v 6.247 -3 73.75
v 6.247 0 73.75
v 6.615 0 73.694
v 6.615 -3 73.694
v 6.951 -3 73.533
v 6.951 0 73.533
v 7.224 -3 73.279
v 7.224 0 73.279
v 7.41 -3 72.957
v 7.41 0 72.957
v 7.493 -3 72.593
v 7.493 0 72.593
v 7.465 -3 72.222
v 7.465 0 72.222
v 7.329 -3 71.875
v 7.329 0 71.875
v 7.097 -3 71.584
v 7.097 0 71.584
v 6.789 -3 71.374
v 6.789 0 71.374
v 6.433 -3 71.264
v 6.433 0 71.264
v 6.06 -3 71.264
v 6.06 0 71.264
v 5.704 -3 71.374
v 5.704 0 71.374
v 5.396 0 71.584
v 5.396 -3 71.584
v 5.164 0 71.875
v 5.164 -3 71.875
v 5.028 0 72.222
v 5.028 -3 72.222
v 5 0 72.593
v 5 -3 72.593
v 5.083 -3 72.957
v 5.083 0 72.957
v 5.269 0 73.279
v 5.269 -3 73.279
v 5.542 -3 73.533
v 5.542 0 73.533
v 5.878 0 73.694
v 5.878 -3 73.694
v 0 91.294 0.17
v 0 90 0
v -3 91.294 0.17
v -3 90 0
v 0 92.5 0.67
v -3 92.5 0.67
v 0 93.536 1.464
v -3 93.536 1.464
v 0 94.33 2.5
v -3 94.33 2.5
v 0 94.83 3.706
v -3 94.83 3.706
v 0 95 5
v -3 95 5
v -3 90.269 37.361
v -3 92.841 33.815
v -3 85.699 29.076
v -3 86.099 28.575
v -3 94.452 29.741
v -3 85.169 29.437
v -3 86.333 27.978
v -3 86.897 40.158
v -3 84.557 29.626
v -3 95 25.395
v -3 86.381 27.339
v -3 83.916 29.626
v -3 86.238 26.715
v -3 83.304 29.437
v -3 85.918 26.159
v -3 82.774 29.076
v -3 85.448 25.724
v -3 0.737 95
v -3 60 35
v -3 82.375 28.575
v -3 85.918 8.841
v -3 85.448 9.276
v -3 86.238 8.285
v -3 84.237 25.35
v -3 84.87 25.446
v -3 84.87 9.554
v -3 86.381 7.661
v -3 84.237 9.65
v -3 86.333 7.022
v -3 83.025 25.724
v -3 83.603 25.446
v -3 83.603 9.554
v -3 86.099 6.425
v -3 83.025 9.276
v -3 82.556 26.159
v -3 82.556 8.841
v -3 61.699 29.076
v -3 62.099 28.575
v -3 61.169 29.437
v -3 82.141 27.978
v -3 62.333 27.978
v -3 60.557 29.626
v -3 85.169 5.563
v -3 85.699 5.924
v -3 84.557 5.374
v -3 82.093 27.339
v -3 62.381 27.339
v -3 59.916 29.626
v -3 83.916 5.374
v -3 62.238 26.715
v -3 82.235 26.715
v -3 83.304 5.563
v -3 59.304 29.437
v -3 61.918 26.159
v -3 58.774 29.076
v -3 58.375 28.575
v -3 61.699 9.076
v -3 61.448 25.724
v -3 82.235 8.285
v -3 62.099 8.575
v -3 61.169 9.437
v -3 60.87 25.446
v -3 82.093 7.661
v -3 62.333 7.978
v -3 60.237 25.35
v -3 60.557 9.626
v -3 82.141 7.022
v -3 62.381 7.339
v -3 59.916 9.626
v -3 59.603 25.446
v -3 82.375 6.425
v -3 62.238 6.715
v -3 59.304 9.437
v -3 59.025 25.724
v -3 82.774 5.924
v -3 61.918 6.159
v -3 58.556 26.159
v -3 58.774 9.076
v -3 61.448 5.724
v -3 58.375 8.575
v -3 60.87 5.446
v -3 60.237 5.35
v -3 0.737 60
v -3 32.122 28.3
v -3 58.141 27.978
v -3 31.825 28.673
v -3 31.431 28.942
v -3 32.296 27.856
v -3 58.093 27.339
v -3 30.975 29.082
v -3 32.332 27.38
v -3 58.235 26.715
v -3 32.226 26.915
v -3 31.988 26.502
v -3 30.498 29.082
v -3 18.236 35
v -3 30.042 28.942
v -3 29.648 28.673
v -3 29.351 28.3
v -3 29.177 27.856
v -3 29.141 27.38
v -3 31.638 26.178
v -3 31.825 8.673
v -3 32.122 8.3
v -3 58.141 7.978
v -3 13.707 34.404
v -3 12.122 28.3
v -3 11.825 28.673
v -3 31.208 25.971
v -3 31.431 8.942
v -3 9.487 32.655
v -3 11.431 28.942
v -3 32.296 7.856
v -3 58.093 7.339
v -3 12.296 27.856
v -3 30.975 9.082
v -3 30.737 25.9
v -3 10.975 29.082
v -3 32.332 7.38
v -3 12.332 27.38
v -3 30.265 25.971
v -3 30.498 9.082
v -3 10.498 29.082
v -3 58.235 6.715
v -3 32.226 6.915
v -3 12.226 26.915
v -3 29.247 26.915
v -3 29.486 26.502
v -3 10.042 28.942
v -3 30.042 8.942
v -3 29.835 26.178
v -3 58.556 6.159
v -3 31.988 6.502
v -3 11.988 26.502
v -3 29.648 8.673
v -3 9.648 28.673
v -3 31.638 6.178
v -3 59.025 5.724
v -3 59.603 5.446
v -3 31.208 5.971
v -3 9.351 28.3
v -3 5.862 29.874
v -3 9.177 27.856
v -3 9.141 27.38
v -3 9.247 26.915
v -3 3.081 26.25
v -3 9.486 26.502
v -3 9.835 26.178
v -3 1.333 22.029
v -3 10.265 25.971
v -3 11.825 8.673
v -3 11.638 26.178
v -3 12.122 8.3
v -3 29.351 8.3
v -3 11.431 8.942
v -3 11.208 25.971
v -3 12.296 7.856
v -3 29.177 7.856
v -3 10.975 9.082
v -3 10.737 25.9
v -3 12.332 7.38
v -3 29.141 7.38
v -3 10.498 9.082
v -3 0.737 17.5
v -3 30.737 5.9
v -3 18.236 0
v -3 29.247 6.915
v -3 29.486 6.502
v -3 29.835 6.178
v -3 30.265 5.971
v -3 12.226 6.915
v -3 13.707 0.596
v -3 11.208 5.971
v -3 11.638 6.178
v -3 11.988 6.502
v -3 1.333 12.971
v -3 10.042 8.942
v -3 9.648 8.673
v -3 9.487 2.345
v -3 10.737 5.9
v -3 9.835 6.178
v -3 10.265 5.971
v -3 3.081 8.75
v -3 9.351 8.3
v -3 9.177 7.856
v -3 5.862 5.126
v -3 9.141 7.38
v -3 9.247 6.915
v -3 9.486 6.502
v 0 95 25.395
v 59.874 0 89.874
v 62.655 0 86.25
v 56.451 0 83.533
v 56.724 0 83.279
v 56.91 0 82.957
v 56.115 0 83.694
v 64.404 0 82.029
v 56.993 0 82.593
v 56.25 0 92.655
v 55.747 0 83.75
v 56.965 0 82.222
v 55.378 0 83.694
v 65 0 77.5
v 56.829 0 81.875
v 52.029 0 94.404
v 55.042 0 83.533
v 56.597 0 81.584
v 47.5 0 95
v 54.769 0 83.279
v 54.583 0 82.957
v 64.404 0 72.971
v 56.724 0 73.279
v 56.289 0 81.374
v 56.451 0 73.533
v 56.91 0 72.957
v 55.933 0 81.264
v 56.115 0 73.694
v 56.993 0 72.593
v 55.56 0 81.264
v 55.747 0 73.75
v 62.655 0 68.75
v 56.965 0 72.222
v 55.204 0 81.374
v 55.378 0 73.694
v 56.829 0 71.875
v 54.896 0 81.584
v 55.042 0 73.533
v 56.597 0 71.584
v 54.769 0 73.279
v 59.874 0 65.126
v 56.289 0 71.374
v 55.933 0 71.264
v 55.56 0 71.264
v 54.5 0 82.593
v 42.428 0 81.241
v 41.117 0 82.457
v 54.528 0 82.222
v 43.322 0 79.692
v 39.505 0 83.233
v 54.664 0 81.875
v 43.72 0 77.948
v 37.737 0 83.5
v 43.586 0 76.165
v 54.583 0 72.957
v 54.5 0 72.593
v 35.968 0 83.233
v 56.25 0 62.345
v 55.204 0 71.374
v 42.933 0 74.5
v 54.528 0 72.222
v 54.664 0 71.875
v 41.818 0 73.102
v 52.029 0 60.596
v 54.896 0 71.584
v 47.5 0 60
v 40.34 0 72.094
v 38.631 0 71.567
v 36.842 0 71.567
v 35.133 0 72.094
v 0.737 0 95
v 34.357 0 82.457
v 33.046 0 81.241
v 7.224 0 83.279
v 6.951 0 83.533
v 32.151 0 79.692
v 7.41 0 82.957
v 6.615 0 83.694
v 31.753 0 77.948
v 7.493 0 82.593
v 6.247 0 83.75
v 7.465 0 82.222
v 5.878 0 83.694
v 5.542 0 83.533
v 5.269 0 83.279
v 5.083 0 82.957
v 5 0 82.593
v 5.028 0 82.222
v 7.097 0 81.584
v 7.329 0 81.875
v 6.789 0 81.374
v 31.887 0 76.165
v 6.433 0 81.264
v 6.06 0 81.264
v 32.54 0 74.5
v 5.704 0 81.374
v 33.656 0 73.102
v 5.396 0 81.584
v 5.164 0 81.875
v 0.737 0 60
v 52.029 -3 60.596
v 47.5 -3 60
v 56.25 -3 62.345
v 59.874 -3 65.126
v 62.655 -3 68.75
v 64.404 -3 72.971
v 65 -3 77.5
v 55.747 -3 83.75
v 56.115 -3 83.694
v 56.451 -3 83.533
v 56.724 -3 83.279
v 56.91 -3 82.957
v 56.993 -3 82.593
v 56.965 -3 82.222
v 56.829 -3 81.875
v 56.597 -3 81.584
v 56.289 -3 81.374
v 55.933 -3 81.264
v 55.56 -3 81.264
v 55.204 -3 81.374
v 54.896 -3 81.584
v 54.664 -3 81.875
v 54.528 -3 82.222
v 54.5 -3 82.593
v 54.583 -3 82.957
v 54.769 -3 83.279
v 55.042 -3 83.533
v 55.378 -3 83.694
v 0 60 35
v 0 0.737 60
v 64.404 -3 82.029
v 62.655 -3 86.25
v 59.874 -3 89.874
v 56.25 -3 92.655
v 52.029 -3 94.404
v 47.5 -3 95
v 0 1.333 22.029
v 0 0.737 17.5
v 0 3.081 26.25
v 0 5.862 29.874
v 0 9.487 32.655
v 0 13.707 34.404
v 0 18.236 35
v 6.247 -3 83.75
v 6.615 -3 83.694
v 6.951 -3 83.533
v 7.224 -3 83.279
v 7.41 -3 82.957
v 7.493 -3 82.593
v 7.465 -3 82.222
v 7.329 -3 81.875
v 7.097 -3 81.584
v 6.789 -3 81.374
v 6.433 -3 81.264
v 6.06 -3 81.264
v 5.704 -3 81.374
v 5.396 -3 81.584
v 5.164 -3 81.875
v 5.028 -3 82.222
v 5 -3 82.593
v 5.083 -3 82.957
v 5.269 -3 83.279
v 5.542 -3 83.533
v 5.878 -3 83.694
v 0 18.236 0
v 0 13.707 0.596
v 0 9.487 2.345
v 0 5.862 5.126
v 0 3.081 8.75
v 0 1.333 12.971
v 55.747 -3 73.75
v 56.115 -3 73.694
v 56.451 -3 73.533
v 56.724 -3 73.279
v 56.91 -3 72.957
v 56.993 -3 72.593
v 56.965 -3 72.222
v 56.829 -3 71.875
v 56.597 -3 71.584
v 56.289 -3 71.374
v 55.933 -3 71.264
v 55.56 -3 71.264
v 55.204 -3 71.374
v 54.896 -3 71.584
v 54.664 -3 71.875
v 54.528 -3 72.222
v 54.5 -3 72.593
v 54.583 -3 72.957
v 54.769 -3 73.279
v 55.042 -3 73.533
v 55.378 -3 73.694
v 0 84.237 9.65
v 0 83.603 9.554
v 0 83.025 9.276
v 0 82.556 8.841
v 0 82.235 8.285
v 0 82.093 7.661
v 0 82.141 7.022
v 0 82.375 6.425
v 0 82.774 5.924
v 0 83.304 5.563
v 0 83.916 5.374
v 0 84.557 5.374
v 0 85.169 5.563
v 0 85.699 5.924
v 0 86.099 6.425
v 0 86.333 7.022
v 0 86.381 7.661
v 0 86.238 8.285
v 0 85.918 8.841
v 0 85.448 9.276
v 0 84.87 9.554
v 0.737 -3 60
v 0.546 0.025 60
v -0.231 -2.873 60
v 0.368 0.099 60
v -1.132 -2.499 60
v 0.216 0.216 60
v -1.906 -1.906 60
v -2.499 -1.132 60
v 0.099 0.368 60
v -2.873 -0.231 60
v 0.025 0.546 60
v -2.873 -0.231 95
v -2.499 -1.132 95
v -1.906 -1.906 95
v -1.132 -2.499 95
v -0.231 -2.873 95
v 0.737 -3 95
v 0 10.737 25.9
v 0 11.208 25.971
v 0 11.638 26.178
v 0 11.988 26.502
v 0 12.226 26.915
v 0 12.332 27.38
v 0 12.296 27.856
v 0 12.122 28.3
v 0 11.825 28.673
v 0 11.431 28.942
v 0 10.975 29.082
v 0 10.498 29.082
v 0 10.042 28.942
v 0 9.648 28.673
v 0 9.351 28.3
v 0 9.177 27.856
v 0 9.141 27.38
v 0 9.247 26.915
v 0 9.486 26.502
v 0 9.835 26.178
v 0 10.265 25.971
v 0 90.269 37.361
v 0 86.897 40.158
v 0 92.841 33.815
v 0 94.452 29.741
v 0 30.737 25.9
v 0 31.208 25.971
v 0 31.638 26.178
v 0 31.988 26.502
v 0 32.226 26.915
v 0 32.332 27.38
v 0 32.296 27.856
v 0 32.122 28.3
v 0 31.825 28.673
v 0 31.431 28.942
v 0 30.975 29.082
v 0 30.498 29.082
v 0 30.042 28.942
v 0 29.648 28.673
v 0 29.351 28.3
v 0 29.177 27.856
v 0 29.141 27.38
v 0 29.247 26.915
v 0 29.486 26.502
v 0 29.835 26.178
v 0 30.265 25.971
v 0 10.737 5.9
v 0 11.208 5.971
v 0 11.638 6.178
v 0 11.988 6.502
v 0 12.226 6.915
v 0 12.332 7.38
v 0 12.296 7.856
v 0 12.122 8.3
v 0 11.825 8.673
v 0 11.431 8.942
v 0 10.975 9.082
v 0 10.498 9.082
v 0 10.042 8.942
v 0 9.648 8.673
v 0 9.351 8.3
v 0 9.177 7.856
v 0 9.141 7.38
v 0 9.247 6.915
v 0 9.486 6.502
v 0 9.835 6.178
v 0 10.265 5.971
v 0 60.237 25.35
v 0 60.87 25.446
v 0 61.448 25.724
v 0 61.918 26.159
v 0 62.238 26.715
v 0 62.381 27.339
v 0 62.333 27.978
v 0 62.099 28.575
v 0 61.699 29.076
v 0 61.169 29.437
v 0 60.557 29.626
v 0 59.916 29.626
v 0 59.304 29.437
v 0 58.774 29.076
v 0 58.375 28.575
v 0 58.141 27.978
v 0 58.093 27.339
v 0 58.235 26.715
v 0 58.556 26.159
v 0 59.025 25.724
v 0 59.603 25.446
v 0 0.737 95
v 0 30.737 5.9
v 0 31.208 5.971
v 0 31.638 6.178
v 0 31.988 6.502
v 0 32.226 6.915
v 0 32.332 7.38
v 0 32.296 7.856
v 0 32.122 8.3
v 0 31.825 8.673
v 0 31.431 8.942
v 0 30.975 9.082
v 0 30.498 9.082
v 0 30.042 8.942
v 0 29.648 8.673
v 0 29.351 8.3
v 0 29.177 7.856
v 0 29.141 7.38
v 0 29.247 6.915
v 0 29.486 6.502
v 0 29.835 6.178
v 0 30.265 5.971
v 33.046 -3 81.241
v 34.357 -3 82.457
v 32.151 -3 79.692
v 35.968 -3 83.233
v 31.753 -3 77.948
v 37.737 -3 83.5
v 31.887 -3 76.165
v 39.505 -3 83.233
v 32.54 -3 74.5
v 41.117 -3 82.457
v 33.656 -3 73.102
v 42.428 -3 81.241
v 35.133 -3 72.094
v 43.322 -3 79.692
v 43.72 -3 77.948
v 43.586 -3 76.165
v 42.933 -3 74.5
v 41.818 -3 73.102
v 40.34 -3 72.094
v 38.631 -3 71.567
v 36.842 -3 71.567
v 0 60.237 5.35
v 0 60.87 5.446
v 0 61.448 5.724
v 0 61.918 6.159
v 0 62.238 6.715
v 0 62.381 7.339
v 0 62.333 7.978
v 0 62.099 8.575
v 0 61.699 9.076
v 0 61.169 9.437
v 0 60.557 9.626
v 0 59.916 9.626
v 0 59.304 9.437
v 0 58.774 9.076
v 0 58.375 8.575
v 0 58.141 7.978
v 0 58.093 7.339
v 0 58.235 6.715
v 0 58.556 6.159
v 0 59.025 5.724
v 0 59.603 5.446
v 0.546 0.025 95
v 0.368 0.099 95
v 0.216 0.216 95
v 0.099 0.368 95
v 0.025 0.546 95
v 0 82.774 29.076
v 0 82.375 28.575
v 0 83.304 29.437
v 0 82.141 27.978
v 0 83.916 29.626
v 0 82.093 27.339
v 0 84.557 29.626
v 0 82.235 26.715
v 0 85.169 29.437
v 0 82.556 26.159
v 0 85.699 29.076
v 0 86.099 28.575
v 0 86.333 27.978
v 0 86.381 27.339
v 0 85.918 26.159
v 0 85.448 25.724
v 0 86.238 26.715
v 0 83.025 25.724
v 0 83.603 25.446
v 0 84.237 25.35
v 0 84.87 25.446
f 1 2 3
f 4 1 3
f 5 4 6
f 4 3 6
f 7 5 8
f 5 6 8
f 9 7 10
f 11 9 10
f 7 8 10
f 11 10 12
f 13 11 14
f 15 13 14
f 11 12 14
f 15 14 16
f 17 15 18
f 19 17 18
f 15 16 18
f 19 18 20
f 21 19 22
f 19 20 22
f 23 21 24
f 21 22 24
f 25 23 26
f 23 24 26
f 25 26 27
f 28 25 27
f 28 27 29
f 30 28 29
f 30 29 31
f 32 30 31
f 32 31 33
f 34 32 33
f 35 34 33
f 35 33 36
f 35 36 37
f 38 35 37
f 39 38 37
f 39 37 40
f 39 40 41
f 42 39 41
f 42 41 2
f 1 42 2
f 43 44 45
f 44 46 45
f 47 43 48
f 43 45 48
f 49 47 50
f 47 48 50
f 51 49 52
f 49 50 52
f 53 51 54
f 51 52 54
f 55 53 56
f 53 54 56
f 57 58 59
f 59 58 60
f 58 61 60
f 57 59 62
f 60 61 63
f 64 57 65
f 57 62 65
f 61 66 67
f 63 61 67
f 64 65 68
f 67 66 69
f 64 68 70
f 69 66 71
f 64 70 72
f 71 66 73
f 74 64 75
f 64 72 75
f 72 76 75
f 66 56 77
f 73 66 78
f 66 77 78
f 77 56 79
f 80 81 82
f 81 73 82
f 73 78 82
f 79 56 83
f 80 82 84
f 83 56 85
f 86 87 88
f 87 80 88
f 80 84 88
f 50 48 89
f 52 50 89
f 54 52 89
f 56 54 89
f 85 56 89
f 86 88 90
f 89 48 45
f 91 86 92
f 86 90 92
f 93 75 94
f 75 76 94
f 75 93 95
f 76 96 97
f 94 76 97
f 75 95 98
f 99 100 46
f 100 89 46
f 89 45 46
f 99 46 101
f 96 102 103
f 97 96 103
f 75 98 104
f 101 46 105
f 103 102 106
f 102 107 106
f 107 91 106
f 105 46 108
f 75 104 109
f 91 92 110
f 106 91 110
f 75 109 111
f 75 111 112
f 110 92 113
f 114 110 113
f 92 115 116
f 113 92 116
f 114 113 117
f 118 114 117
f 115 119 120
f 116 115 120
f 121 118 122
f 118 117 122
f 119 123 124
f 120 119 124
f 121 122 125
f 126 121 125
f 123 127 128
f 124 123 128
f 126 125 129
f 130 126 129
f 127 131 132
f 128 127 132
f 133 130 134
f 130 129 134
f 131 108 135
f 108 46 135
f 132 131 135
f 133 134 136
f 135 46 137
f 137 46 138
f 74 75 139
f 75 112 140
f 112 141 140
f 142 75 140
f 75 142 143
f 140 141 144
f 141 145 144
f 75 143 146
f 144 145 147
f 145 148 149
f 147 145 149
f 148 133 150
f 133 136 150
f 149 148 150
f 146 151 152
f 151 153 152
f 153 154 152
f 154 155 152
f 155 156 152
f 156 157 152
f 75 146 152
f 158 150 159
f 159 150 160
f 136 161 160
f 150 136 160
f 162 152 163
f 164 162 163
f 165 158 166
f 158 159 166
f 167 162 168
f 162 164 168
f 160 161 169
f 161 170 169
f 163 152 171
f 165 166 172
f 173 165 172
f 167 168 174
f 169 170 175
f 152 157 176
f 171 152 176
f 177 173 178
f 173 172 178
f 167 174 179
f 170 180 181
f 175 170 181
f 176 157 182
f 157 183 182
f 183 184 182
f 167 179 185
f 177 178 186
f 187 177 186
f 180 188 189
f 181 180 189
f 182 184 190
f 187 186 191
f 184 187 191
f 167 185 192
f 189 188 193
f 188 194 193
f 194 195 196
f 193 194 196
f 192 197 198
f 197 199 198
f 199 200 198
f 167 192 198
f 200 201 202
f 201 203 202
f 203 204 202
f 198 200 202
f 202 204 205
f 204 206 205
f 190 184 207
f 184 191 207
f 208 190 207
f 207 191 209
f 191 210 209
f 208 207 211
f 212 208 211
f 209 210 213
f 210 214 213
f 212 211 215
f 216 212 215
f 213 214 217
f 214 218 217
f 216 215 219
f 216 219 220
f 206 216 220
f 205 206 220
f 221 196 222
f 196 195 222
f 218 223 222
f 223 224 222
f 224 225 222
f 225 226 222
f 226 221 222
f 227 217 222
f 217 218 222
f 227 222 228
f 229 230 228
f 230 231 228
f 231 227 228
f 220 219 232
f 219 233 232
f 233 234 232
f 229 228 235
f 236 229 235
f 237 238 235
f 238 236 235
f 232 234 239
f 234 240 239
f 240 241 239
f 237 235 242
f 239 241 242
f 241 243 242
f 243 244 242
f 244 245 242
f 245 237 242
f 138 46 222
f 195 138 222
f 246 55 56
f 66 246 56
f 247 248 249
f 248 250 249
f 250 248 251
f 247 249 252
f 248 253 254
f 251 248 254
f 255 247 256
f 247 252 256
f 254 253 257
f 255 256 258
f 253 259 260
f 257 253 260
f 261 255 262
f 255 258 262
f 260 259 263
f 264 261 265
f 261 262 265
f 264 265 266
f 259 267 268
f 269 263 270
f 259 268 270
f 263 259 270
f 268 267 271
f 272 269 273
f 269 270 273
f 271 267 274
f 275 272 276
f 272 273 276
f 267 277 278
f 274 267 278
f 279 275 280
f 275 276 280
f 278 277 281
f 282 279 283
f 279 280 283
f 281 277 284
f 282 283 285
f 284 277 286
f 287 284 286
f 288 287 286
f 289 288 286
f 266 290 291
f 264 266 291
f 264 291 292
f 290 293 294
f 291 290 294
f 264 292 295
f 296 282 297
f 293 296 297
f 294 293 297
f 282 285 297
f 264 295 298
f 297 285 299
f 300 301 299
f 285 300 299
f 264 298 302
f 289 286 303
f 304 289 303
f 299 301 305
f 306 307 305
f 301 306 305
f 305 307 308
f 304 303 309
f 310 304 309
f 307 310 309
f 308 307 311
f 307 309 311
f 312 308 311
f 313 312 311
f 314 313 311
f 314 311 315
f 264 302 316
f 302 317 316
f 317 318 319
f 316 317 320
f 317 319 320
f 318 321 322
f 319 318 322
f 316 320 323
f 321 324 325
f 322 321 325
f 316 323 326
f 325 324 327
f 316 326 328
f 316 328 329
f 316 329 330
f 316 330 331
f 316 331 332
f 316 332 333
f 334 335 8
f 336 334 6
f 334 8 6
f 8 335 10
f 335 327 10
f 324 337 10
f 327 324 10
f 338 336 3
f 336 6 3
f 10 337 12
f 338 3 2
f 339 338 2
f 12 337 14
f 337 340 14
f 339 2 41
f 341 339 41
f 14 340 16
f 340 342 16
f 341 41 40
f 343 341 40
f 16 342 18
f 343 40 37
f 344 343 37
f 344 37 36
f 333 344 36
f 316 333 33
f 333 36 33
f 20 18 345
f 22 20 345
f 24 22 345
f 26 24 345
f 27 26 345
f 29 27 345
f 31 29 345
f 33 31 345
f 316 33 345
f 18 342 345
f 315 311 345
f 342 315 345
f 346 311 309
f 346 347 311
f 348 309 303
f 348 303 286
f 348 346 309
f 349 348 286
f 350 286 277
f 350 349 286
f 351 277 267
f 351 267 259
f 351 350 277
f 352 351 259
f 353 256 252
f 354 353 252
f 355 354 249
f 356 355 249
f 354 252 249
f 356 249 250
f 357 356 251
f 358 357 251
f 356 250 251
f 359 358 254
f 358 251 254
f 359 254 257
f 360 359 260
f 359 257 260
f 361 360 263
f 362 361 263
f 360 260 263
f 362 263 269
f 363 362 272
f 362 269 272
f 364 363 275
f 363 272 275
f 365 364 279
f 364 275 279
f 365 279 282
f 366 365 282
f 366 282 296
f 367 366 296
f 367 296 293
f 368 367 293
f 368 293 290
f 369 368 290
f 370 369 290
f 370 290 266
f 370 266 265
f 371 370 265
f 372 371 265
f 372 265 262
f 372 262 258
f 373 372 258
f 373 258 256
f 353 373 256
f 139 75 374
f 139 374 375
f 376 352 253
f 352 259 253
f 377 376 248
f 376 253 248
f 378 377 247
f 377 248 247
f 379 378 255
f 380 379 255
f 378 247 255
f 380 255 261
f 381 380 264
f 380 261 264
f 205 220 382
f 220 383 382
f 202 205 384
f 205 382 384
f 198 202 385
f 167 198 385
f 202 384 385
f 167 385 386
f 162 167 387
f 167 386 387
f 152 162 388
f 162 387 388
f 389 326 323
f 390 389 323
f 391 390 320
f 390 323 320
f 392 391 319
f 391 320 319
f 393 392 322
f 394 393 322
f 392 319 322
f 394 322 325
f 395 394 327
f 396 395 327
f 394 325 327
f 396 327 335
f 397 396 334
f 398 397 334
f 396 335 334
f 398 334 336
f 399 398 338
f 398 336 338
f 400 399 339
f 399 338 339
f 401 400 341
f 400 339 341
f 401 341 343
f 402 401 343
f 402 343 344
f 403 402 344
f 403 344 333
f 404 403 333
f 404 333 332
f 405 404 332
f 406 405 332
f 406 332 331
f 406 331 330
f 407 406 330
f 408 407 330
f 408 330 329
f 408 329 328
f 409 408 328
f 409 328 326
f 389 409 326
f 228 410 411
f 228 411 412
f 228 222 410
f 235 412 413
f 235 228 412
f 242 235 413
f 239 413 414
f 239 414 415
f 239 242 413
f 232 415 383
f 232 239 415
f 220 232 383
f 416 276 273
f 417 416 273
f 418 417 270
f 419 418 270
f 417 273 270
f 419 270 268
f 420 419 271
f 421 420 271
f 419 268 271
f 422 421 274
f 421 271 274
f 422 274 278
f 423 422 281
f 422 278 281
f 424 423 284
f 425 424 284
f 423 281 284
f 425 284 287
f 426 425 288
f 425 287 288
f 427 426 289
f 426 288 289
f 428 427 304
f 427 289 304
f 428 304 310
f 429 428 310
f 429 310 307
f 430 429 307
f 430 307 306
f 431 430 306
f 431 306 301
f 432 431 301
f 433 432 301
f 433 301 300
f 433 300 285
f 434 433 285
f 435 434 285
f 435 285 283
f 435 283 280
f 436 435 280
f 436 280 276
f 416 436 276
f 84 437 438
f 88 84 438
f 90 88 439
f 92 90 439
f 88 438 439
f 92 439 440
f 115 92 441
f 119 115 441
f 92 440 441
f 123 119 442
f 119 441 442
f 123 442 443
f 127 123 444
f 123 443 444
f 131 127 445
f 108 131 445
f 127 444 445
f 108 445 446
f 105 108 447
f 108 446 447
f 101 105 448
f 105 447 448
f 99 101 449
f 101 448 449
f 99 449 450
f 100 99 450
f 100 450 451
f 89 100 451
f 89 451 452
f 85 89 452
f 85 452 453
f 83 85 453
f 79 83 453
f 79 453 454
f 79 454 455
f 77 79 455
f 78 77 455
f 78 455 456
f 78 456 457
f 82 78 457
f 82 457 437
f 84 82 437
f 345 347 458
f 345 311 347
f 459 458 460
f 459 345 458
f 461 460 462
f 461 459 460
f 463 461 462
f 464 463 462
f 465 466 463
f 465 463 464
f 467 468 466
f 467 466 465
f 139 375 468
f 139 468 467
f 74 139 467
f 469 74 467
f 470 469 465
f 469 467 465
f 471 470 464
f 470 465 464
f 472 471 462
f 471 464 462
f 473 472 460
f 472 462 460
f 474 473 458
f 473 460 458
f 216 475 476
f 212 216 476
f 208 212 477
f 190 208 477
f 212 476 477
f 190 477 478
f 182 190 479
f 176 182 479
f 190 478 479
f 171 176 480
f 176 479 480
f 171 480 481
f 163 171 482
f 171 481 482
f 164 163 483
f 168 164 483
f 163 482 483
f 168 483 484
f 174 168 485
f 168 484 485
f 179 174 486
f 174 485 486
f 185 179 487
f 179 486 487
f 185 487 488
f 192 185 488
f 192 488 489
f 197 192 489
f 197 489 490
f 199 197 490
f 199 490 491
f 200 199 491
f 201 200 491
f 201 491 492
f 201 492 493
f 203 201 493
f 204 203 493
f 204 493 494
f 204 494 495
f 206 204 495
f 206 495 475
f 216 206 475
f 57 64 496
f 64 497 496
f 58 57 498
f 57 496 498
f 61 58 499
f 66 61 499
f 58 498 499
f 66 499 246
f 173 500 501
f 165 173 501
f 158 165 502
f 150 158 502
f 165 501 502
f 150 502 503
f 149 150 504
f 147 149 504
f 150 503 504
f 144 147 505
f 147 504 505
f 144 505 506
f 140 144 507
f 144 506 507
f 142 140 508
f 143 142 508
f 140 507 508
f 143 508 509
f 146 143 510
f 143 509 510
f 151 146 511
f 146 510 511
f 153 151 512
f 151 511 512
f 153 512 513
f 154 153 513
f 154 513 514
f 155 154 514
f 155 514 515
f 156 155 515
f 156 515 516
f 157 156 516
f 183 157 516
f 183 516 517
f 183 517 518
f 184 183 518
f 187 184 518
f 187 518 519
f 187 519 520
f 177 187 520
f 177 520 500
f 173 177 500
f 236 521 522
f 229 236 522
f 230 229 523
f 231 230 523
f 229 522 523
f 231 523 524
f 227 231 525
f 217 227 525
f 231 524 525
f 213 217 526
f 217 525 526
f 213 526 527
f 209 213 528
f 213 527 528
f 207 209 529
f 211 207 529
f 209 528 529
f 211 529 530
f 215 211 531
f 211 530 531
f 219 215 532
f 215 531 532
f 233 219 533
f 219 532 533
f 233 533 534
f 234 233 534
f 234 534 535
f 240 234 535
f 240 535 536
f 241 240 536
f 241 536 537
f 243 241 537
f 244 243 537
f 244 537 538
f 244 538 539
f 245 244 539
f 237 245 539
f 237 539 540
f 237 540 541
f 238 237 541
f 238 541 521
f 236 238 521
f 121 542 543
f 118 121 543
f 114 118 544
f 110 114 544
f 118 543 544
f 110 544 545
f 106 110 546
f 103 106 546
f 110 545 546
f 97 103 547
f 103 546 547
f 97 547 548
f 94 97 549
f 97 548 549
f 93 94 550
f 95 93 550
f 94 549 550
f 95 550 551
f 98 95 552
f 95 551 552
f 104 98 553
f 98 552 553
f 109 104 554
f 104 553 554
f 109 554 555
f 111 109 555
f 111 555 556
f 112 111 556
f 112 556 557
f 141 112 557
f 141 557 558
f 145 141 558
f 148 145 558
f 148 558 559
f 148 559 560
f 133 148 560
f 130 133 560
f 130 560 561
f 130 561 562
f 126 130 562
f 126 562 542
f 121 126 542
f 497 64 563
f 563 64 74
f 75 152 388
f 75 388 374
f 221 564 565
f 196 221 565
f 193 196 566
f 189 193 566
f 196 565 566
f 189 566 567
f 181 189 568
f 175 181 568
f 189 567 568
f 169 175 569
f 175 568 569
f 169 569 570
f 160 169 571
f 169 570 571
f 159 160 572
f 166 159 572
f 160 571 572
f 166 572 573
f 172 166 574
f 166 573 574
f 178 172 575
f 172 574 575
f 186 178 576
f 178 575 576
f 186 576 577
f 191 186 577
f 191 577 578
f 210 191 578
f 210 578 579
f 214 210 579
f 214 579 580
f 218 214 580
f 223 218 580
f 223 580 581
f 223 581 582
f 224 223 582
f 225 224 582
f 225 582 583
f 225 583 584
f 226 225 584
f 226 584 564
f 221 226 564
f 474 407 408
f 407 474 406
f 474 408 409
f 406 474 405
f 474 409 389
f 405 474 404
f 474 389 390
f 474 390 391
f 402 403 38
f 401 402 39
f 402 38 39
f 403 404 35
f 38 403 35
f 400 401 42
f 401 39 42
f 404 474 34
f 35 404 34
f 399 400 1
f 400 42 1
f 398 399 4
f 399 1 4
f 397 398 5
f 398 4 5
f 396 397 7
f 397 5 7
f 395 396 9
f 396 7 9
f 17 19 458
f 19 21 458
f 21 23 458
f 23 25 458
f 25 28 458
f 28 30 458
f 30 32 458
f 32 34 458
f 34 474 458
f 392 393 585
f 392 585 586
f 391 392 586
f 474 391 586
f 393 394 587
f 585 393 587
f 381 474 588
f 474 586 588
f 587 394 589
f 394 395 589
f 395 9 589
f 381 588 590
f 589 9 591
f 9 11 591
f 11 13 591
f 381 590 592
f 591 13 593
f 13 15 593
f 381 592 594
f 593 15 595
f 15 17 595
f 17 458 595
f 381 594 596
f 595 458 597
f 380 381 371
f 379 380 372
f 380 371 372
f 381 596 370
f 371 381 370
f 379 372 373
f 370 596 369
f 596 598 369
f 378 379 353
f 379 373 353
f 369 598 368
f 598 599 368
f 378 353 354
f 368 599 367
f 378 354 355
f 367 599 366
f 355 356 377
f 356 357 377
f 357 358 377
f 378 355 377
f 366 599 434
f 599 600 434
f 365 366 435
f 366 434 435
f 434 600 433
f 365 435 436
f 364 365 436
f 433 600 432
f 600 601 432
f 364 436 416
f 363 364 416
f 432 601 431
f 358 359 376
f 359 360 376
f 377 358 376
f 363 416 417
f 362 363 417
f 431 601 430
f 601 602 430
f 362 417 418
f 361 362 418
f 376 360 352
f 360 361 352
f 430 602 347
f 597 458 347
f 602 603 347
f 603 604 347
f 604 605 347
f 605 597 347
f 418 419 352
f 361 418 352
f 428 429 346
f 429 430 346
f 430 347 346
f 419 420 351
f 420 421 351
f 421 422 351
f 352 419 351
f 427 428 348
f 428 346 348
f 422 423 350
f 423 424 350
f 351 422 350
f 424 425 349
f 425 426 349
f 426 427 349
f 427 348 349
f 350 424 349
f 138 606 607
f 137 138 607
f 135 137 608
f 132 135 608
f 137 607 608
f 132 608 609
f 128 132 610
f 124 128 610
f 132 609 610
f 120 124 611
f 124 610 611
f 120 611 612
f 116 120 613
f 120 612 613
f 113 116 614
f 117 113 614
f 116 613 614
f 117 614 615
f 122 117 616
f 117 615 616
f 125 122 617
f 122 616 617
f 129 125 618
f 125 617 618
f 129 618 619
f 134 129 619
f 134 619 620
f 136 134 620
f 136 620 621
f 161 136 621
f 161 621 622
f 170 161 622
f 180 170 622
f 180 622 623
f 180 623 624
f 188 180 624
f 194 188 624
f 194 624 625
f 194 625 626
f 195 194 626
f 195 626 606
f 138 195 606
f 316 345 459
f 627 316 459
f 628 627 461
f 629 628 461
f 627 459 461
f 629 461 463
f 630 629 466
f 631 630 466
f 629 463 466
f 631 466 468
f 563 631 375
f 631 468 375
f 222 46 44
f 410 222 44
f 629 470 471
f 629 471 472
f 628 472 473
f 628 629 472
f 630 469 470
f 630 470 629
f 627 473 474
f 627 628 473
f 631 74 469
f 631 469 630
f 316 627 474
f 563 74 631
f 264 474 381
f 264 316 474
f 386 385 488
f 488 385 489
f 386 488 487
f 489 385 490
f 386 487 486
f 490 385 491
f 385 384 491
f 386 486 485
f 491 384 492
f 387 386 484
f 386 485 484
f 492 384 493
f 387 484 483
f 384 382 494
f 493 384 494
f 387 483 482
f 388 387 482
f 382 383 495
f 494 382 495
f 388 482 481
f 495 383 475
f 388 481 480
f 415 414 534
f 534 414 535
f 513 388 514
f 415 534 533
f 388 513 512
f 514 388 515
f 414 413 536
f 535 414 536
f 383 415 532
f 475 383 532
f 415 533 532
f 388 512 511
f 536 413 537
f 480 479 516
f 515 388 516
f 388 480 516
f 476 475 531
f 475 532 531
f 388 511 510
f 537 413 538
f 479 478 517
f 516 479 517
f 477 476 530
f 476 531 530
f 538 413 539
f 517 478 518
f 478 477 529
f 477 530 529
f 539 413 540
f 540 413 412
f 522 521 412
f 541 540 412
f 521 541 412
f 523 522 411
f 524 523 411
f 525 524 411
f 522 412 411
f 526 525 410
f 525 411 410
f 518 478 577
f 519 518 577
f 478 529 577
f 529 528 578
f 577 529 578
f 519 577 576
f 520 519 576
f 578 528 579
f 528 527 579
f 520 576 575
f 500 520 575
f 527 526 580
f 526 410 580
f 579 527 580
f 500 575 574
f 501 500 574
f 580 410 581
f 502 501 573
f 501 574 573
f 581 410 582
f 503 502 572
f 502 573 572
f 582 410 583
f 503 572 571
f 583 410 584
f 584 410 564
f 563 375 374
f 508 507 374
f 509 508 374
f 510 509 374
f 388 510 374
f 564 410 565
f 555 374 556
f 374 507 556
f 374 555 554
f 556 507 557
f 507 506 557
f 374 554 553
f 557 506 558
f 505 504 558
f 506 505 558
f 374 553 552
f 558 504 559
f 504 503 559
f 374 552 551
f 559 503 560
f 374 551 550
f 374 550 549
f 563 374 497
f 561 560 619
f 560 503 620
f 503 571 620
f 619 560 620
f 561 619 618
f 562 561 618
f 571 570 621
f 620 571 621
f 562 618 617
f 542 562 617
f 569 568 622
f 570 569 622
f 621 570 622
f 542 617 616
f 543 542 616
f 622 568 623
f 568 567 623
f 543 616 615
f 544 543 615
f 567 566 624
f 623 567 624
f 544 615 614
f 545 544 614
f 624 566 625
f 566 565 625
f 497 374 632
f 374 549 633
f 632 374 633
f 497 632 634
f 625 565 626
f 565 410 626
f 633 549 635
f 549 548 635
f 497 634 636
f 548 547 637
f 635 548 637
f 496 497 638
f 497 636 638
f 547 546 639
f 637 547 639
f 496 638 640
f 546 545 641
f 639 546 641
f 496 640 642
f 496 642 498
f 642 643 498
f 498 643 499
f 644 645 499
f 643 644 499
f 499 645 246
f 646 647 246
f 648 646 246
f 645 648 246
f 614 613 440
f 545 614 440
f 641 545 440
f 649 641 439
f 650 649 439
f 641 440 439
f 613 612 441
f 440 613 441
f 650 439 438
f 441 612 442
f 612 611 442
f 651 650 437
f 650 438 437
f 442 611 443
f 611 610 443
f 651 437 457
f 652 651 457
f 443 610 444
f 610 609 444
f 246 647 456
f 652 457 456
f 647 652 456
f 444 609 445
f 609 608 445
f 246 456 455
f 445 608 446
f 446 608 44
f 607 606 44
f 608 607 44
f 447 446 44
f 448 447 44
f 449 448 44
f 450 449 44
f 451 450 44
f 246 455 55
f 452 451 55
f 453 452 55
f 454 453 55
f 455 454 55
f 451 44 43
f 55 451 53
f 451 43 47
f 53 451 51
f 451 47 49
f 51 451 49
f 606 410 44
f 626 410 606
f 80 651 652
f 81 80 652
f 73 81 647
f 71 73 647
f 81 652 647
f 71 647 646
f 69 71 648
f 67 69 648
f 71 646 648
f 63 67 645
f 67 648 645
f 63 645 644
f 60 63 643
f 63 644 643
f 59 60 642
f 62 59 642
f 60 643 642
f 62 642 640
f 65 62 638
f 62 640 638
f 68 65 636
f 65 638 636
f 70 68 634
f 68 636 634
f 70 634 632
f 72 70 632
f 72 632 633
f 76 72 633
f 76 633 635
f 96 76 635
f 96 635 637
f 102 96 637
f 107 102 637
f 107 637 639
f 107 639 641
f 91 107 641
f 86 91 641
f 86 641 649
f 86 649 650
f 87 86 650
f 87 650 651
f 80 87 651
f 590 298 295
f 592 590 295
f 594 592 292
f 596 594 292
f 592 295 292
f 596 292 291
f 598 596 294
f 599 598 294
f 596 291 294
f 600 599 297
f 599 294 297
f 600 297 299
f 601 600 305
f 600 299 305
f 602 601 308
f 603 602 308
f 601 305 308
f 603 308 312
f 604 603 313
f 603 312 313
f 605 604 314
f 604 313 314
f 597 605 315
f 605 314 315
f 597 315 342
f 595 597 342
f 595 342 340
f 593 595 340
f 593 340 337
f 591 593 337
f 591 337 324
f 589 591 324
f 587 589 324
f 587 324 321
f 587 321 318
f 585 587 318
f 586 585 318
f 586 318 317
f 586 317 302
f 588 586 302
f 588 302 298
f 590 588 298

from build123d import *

# Parameters (mm, degrees)
SM_BASE_FLANGE_1_DEPTH = 95
FILLET_1_R             = 17.5
SKETCH_9_R             = 2.15
SKETCH_9_R_2           = 1.6
CUT_EXTRUDE_1_DEPTH    = 10
FILLET_2_R             = 5
CUT_EXTRUDE_START      = -10
CUT_EXTRUDE_2_DEPTH    = 10
SKETCH_14_W            = 71.334593732
SKETCH_14_H            = 13.225299836
CUT_EXTRUDE_3_DEPTH    = 60
FILLET_4_R             = 17.5
FILLET_5_R             = 17.5
SKETCH_15_R            = 6
CUT_EXTRUDE_4_DEPTH    = 10
SKETCH_16_R            = 1.25
CUT_EXTRUDE_5_DEPTH    = 10


# Sheet-metal steps are written as plain solids
with BuildPart() as part:
    # Sketch 2 → 基材-凸緣1 (new body)
    with BuildSketch(Plane.XY):
        with BuildLine():
            Line((65, 0), (0.7366, 0))
            ThreePointArc((0.7366, 0), (0.215745145, 0.215745145), (0, 0.7366))
            Line((0, 0.7366), (0, 95))
            Line((0, 95), (-3, 95))
            Line((-3, 95), (-3, 0.7366))
            ThreePointArc((-3, 0.7366), (-1.905575199, -1.905575199), (0.7366, -3))
            Line((0.7366, -3), (65, -3))
            Line((65, -3), (65, 0))
        make_face()
    extrude(amount=SM_BASE_FLANGE_1_DEPTH)

    # 圓角1
    fillet_1_edges = [part.edges().sort_by_distance(p)[0] for p in [
        (65, -1.5, 95),
        (65, -1.5, 0),
    ]]
    fillet(fillet_1_edges, radius=FILLET_1_R)

    # 草圖9 → 除料-伸長1 (cut)
    with BuildSketch(Plane(origin=(0, 0, 0), x_dir=(0, 0, -1), z_dir=(1, 0, 0))):
        with Locations((-7.5, 60.2366)):
            Circle(SKETCH_9_R)
        with Locations((-27.5, 60.2366)):
            Circle(SKETCH_9_R)
        with BuildLine():
            ThreePointArc((-5.35, 84.2366), (-7.5, 86.3866), (-9.65, 84.2366))
            ThreePointArc((-9.65, 84.2366), (-7.5, 82.0866), (-5.35, 84.2366))
        make_face()
        with Locations((-27.5, 84.2366)):
            Circle(SKETCH_9_R)
        with Locations((-7.5, 30.7366)):
            Circle(SKETCH_9_R_2)
        with Locations((-7.5, 10.7366)):
            Circle(SKETCH_9_R_2)
        with Locations((-27.5, 10.7366)):
            Circle(SKETCH_9_R_2)
        with Locations((-27.5, 30.7366)):
            Circle(SKETCH_9_R_2)
    extrude(amount=-CUT_EXTRUDE_1_DEPTH, mode=Mode.SUBTRACT)

    # 圓角2
    fillet_2_edges = [part.edges().sort_by_distance(p)[0] for p in [
        (-1.5, 95, 95),
        (-1.5, 95, 0),
    ]]
    fillet(fillet_2_edges, radius=FILLET_2_R)

    # 草圖12 → 除料-伸長2 (cut)
    with BuildSketch(Plane(origin=(0, 0, 0), x_dir=(0, 0, -1), z_dir=(1, 0, 0)).offset(CUT_EXTRUDE_START)):
        Polygon((-35, 0.7366), (-35, 60), (-60, 0.7366), align=None)
        with BuildLine():
            Line((-90, 95), (-35, 95))
            Line((-35, 95), (-95, 0.7366))
            Line((-95, 0.7366), (-95, 90))
            ThreePointArc((-95, 90), (-93.535533906, 93.535533906), (-90, 95))
        make_face()
    extrude(amount=CUT_EXTRUDE_2_DEPTH, mode=Mode.SUBTRACT)

    # 草圖14 → 除料-伸長3 (cut)
    with BuildSketch(Plane(origin=(0, 0, 0), x_dir=(-1, 0, 0), z_dir=(0, 0, -1))):
        with Locations((-32.667296866, -5.876049918)):
            Rectangle(SKETCH_14_W, SKETCH_14_H)
    extrude(amount=-CUT_EXTRUDE_3_DEPTH, mode=Mode.SUBTRACT)

    # 圓角4
    fillet_4_edges = [part.edges().sort_by_distance(p)[0] for p in [
        (-1.5, 0.7366, 35),
        (-1.5, 0.7366, 0),
        (65, -1.5, 60),
    ]]
    fillet(fillet_4_edges, radius=FILLET_4_R - 0.0001)  # a hair under: the kernel refuses the full size

    # 圓角5
    fillet_5_edges = [part.edges().sort_by_distance(p)[0] for p in [
        (-1.5, 95, 35),
    ]]
    fillet(fillet_5_edges, radius=FILLET_5_R)

    # 草圖15 → 除料-伸長4 (cut)
    with BuildSketch(Plane(origin=(0, 0, 0), x_dir=(1, 0, 0), z_dir=(0, 1, 0))):
        with Locations(Location((37.7366, -77.5, 0), (0, 0, 270))):
            Circle(SKETCH_15_R)
    extrude(amount=-CUT_EXTRUDE_4_DEPTH, mode=Mode.SUBTRACT)

    # 草圖16 → 除料-伸長5 (cut)
    with BuildSketch(Plane(origin=(0, 0, 0), x_dir=(1, 0, 0), z_dir=(0, 1, 0))):
        with Locations(Location((6.2466, -72.5, 0), (0, 0, 270))):
            Circle(SKETCH_16_R)
        with Locations(Location((55.7466, -72.5, 0), (0, 0, 270))):
            Circle(SKETCH_16_R)
        with Locations(Location((55.7466, -82.5, 0), (0, 0, 270))):
            Circle(SKETCH_16_R)
        with Locations(Location((6.2466, -82.5, 0), (0, 0, 270))):
            Circle(SKETCH_16_R)
    extrude(amount=-CUT_EXTRUDE_5_DEPTH, mode=Mode.SUBTRACT)


solid = part.part
